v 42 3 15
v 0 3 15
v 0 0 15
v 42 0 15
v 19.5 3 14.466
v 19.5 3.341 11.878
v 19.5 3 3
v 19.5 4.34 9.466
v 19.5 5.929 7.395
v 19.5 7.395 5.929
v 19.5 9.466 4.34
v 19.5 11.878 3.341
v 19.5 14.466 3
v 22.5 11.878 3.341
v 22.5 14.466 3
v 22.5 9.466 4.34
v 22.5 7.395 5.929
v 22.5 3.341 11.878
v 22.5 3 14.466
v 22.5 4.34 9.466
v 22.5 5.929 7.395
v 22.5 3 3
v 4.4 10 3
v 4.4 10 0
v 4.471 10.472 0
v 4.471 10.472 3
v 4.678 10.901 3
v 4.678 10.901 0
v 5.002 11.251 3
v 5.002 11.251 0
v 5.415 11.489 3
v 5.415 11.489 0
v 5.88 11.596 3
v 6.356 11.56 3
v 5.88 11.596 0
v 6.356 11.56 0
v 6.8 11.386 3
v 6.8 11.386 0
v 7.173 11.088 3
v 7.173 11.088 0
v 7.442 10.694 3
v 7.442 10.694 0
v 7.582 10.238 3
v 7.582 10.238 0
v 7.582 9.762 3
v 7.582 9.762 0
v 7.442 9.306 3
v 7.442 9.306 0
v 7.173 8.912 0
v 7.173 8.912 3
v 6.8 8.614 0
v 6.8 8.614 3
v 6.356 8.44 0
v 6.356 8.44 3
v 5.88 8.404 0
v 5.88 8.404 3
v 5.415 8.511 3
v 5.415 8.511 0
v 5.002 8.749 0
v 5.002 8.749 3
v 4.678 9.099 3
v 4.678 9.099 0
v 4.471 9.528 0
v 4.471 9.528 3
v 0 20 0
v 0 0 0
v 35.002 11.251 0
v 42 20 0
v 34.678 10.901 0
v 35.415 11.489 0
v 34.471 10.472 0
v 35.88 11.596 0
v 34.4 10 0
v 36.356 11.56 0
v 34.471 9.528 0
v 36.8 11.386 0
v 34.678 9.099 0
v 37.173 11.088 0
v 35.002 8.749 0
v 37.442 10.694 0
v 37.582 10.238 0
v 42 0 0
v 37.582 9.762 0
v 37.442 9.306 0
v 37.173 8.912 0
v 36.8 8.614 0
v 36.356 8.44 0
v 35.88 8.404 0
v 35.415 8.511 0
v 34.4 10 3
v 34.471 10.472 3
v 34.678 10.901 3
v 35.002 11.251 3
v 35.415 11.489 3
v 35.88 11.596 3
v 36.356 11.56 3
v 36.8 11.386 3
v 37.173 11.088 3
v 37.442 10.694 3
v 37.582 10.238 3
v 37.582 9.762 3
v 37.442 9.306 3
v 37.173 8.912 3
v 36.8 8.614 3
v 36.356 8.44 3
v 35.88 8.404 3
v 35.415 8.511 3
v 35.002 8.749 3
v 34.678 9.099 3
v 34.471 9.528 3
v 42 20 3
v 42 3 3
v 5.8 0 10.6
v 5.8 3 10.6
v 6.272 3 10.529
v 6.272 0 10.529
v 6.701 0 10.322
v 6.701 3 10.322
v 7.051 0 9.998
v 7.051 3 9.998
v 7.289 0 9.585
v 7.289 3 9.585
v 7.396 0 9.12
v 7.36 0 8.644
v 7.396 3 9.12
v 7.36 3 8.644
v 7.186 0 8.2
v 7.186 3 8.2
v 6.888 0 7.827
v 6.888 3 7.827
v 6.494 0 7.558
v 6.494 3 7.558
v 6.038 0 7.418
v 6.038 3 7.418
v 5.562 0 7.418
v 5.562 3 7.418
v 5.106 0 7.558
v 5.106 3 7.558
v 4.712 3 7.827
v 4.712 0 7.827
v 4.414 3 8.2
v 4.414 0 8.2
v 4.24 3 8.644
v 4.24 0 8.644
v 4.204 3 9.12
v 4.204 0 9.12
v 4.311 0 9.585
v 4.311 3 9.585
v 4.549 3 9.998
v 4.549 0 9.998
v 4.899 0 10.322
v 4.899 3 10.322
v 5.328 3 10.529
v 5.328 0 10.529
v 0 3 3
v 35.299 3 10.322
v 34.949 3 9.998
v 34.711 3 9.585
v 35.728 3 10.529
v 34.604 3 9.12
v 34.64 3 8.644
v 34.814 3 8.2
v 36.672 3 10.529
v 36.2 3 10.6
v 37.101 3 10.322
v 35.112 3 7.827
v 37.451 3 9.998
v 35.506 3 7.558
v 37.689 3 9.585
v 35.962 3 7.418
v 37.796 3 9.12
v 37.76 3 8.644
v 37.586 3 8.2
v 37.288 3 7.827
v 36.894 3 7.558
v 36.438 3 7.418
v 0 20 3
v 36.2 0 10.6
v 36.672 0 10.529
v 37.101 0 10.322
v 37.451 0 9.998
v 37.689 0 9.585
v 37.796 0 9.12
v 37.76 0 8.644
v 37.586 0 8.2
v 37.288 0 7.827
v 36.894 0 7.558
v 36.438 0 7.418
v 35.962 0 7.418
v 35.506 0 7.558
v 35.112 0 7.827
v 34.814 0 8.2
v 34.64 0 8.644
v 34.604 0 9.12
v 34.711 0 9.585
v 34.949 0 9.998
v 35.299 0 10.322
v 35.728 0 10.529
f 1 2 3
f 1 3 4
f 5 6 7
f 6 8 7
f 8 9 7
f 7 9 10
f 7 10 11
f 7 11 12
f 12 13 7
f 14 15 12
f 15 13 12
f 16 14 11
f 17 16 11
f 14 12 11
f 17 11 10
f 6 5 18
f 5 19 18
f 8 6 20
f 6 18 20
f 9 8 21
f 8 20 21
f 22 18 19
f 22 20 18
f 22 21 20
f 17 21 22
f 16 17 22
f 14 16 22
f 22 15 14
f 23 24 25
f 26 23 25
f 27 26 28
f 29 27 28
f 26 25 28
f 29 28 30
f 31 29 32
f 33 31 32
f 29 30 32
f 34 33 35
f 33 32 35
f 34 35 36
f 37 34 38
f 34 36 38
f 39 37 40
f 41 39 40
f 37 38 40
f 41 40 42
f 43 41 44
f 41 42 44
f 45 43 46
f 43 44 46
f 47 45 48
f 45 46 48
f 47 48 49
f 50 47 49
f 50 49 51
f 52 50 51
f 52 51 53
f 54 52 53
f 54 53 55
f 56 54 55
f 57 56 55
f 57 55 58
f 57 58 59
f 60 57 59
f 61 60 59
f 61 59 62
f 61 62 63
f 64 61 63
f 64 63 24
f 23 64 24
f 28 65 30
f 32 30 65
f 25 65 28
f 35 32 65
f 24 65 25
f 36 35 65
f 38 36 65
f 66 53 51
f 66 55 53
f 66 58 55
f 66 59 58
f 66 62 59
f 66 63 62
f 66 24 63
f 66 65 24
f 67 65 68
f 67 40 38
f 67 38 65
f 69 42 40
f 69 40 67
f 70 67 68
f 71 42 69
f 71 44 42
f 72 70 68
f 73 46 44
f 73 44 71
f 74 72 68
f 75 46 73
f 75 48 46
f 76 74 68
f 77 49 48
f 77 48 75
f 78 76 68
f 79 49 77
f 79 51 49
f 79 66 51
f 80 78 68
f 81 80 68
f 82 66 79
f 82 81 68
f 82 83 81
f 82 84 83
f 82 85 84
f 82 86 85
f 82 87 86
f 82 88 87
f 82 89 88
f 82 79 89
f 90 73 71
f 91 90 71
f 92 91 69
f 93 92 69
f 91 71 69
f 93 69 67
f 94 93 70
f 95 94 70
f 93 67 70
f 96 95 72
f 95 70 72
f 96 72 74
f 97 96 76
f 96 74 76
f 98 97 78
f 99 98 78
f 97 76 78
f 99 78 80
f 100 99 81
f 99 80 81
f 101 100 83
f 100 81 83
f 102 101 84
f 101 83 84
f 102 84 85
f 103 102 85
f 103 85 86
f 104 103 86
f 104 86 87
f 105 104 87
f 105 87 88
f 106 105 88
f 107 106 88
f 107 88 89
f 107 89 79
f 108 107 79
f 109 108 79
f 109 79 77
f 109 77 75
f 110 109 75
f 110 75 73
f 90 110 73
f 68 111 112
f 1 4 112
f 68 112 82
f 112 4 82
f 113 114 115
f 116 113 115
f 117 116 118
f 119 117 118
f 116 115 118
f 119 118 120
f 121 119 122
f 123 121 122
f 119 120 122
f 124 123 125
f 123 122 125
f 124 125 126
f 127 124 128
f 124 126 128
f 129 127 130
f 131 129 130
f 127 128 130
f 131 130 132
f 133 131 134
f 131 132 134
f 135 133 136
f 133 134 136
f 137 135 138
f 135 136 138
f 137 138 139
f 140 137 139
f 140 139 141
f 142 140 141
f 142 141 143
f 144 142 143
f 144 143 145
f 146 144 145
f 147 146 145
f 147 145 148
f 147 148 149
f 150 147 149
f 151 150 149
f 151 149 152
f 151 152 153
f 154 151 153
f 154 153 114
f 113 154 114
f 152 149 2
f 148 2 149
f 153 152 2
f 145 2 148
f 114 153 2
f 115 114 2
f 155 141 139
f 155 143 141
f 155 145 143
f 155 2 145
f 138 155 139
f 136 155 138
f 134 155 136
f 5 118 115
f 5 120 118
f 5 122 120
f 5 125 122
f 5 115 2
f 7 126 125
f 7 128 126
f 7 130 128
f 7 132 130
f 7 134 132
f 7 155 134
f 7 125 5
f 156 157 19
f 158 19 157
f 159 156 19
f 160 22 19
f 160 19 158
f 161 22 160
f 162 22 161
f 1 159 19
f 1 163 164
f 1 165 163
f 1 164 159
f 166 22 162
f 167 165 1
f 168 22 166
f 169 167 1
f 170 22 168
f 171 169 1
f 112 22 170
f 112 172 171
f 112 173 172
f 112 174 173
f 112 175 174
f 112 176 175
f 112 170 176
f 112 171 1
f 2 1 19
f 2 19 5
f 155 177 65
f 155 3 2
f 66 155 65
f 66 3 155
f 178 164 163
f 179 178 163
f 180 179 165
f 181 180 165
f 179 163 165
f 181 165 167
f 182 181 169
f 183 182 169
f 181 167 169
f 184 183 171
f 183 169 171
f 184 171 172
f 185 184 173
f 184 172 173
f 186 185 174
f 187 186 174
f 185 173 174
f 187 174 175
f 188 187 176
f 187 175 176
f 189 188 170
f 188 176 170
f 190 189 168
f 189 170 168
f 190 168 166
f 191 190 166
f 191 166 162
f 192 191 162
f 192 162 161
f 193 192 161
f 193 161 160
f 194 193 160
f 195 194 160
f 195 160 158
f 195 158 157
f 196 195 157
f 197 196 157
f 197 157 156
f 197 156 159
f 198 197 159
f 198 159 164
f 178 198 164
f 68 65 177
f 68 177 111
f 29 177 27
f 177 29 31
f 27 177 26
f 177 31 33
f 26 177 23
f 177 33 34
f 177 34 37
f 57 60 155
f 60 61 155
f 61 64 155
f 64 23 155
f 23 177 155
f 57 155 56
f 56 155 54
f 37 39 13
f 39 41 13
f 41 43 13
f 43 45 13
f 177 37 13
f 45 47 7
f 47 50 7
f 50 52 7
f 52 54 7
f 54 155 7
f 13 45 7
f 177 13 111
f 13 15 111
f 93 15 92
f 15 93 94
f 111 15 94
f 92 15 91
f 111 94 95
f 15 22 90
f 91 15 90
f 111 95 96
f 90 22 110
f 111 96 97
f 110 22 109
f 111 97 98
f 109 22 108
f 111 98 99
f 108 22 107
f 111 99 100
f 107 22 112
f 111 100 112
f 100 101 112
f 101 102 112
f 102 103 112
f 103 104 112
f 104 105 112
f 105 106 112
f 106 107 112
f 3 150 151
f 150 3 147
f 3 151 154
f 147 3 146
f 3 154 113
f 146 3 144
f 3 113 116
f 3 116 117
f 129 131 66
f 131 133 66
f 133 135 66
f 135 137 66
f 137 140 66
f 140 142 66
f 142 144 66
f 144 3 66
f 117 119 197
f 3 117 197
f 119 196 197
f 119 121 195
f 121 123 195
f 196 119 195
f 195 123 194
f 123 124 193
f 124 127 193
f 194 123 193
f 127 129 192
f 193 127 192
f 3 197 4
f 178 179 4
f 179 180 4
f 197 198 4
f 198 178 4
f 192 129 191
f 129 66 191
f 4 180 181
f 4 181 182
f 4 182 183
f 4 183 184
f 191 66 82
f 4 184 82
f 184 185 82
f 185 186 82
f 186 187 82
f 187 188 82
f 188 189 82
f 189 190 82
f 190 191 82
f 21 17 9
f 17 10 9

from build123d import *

# Parameters (mm, degrees)
SKETCH1_W           = 42
SKETCH1_H           = 3
BOSS_EXTRUDE1_DEPTH = 15
SKETCH2_W           = 42
SKETCH2_H           = 3
BOSS_EXTRUDE2_DEPTH = 17
CUT_EXTRUDE1_REACH  = 49.728
SKETCH6_R           = 1.6
CUT_EXTRUDE2_REACH  = 50.877
SKETCH7_R           = 1.6
BOSS_EXTRUDE3_DEPTH = 1.5
FILLET1_R           = 10


with BuildPart() as part:
    # Sketch1 → Boss-Extrude1 (new body)
    with BuildSketch(Plane.XY):
        with Locations((21, 1.5)):
            Rectangle(SKETCH1_W, SKETCH1_H)
    extrude(amount=BOSS_EXTRUDE1_DEPTH)

    # Sketch2 → Boss-Extrude2 (add)
    with BuildSketch(Plane(origin=(0, 3, 0), x_dir=(1, 0, 0), z_dir=(0, 1, 0))):
        with Locations((21, -1.5)):
            Rectangle(SKETCH2_W, SKETCH2_H)
    extrude(amount=BOSS_EXTRUDE2_DEPTH)

    # Sketch6 → Cut-Extrude1 (cut, up to next)
    with BuildSketch(Plane(origin=(0, 3, 0), x_dir=(1, 0, 0), z_dir=(0, 1, 0)), mode=Mode.PRIVATE) as cut_extrude1_sk1:
        with Locations(Location((5.8, -9, 0), (0, 0, 270))):
            Circle(SKETCH6_R)
    cut_extrude1_tool1 = extrude(cut_extrude1_sk1.sketch, amount=-CUT_EXTRUDE1_REACH, mode=Mode.PRIVATE) & part.part
    # Sketch6 → Cut-Extrude1 (cut, up to next)
    with BuildSketch(Plane(origin=(0, 3, 0), x_dir=(1, 0, 0), z_dir=(0, 1, 0)), mode=Mode.PRIVATE) as cut_extrude1_sk2:
        with Locations(Location((36.2, -9, 0), (0, 0, 270))):
            Circle(SKETCH6_R)
    cut_extrude1_tool2 = extrude(cut_extrude1_sk2.sketch, amount=-CUT_EXTRUDE1_REACH, mode=Mode.PRIVATE) & part.part
    add(cut_extrude1_tool1.solids().sort_by_distance((5.8, 3, 9))[0], mode=Mode.SUBTRACT)
    add(cut_extrude1_tool2.solids().sort_by_distance((36.2, 3, 9))[0], mode=Mode.SUBTRACT)

    # Sketch7 → Cut-Extrude2 (cut, up to next)
    with BuildSketch(Plane(origin=(0, 0, 0), x_dir=(-1, 0, 0), z_dir=(0, 0, -1)), mode=Mode.PRIVATE) as cut_extrude2_sk1:
        with Locations((-36, 10)):
            Circle(SKETCH7_R)
    cut_extrude2_tool1 = extrude(cut_extrude2_sk1.sketch, amount=-CUT_EXTRUDE2_REACH, mode=Mode.PRIVATE) & part.part
    # Sketch7 → Cut-Extrude2 (cut, up to next)
    with BuildSketch(Plane(origin=(0, 0, 0), x_dir=(-1, 0, 0), z_dir=(0, 0, -1)), mode=Mode.PRIVATE) as cut_extrude2_sk2:
        with Locations((-6, 10)):
            Circle(SKETCH7_R)
    cut_extrude2_tool2 = extrude(cut_extrude2_sk2.sketch, amount=-CUT_EXTRUDE2_REACH, mode=Mode.PRIVATE) & part.part
    add(cut_extrude2_tool1.solids().sort_by_distance((36, 10, 0))[0], mode=Mode.SUBTRACT)
    add(cut_extrude2_tool2.solids().sort_by_distance((6, 10, 0))[0], mode=Mode.SUBTRACT)

    # Sketch9 → Boss-Extrude3 (add, symmetric)
    with BuildSketch(Plane.ZY.offset(-21)):
        Polygon((3, 10.323968285), (10.323968285, 3), (3, 3), align=None)
    extrude(amount=BOSS_EXTRUDE3_DEPTH, both=True)

    # Fillet1
    fillet1_edges = [part.edges().sort_by_distance(p)[0] for p in [
        (21, 10.323968285, 3),
        (21, 3, 10.323968285),
    ]]
    fillet(fillet1_edges, radius=FILLET1_R)


solid = part.part
